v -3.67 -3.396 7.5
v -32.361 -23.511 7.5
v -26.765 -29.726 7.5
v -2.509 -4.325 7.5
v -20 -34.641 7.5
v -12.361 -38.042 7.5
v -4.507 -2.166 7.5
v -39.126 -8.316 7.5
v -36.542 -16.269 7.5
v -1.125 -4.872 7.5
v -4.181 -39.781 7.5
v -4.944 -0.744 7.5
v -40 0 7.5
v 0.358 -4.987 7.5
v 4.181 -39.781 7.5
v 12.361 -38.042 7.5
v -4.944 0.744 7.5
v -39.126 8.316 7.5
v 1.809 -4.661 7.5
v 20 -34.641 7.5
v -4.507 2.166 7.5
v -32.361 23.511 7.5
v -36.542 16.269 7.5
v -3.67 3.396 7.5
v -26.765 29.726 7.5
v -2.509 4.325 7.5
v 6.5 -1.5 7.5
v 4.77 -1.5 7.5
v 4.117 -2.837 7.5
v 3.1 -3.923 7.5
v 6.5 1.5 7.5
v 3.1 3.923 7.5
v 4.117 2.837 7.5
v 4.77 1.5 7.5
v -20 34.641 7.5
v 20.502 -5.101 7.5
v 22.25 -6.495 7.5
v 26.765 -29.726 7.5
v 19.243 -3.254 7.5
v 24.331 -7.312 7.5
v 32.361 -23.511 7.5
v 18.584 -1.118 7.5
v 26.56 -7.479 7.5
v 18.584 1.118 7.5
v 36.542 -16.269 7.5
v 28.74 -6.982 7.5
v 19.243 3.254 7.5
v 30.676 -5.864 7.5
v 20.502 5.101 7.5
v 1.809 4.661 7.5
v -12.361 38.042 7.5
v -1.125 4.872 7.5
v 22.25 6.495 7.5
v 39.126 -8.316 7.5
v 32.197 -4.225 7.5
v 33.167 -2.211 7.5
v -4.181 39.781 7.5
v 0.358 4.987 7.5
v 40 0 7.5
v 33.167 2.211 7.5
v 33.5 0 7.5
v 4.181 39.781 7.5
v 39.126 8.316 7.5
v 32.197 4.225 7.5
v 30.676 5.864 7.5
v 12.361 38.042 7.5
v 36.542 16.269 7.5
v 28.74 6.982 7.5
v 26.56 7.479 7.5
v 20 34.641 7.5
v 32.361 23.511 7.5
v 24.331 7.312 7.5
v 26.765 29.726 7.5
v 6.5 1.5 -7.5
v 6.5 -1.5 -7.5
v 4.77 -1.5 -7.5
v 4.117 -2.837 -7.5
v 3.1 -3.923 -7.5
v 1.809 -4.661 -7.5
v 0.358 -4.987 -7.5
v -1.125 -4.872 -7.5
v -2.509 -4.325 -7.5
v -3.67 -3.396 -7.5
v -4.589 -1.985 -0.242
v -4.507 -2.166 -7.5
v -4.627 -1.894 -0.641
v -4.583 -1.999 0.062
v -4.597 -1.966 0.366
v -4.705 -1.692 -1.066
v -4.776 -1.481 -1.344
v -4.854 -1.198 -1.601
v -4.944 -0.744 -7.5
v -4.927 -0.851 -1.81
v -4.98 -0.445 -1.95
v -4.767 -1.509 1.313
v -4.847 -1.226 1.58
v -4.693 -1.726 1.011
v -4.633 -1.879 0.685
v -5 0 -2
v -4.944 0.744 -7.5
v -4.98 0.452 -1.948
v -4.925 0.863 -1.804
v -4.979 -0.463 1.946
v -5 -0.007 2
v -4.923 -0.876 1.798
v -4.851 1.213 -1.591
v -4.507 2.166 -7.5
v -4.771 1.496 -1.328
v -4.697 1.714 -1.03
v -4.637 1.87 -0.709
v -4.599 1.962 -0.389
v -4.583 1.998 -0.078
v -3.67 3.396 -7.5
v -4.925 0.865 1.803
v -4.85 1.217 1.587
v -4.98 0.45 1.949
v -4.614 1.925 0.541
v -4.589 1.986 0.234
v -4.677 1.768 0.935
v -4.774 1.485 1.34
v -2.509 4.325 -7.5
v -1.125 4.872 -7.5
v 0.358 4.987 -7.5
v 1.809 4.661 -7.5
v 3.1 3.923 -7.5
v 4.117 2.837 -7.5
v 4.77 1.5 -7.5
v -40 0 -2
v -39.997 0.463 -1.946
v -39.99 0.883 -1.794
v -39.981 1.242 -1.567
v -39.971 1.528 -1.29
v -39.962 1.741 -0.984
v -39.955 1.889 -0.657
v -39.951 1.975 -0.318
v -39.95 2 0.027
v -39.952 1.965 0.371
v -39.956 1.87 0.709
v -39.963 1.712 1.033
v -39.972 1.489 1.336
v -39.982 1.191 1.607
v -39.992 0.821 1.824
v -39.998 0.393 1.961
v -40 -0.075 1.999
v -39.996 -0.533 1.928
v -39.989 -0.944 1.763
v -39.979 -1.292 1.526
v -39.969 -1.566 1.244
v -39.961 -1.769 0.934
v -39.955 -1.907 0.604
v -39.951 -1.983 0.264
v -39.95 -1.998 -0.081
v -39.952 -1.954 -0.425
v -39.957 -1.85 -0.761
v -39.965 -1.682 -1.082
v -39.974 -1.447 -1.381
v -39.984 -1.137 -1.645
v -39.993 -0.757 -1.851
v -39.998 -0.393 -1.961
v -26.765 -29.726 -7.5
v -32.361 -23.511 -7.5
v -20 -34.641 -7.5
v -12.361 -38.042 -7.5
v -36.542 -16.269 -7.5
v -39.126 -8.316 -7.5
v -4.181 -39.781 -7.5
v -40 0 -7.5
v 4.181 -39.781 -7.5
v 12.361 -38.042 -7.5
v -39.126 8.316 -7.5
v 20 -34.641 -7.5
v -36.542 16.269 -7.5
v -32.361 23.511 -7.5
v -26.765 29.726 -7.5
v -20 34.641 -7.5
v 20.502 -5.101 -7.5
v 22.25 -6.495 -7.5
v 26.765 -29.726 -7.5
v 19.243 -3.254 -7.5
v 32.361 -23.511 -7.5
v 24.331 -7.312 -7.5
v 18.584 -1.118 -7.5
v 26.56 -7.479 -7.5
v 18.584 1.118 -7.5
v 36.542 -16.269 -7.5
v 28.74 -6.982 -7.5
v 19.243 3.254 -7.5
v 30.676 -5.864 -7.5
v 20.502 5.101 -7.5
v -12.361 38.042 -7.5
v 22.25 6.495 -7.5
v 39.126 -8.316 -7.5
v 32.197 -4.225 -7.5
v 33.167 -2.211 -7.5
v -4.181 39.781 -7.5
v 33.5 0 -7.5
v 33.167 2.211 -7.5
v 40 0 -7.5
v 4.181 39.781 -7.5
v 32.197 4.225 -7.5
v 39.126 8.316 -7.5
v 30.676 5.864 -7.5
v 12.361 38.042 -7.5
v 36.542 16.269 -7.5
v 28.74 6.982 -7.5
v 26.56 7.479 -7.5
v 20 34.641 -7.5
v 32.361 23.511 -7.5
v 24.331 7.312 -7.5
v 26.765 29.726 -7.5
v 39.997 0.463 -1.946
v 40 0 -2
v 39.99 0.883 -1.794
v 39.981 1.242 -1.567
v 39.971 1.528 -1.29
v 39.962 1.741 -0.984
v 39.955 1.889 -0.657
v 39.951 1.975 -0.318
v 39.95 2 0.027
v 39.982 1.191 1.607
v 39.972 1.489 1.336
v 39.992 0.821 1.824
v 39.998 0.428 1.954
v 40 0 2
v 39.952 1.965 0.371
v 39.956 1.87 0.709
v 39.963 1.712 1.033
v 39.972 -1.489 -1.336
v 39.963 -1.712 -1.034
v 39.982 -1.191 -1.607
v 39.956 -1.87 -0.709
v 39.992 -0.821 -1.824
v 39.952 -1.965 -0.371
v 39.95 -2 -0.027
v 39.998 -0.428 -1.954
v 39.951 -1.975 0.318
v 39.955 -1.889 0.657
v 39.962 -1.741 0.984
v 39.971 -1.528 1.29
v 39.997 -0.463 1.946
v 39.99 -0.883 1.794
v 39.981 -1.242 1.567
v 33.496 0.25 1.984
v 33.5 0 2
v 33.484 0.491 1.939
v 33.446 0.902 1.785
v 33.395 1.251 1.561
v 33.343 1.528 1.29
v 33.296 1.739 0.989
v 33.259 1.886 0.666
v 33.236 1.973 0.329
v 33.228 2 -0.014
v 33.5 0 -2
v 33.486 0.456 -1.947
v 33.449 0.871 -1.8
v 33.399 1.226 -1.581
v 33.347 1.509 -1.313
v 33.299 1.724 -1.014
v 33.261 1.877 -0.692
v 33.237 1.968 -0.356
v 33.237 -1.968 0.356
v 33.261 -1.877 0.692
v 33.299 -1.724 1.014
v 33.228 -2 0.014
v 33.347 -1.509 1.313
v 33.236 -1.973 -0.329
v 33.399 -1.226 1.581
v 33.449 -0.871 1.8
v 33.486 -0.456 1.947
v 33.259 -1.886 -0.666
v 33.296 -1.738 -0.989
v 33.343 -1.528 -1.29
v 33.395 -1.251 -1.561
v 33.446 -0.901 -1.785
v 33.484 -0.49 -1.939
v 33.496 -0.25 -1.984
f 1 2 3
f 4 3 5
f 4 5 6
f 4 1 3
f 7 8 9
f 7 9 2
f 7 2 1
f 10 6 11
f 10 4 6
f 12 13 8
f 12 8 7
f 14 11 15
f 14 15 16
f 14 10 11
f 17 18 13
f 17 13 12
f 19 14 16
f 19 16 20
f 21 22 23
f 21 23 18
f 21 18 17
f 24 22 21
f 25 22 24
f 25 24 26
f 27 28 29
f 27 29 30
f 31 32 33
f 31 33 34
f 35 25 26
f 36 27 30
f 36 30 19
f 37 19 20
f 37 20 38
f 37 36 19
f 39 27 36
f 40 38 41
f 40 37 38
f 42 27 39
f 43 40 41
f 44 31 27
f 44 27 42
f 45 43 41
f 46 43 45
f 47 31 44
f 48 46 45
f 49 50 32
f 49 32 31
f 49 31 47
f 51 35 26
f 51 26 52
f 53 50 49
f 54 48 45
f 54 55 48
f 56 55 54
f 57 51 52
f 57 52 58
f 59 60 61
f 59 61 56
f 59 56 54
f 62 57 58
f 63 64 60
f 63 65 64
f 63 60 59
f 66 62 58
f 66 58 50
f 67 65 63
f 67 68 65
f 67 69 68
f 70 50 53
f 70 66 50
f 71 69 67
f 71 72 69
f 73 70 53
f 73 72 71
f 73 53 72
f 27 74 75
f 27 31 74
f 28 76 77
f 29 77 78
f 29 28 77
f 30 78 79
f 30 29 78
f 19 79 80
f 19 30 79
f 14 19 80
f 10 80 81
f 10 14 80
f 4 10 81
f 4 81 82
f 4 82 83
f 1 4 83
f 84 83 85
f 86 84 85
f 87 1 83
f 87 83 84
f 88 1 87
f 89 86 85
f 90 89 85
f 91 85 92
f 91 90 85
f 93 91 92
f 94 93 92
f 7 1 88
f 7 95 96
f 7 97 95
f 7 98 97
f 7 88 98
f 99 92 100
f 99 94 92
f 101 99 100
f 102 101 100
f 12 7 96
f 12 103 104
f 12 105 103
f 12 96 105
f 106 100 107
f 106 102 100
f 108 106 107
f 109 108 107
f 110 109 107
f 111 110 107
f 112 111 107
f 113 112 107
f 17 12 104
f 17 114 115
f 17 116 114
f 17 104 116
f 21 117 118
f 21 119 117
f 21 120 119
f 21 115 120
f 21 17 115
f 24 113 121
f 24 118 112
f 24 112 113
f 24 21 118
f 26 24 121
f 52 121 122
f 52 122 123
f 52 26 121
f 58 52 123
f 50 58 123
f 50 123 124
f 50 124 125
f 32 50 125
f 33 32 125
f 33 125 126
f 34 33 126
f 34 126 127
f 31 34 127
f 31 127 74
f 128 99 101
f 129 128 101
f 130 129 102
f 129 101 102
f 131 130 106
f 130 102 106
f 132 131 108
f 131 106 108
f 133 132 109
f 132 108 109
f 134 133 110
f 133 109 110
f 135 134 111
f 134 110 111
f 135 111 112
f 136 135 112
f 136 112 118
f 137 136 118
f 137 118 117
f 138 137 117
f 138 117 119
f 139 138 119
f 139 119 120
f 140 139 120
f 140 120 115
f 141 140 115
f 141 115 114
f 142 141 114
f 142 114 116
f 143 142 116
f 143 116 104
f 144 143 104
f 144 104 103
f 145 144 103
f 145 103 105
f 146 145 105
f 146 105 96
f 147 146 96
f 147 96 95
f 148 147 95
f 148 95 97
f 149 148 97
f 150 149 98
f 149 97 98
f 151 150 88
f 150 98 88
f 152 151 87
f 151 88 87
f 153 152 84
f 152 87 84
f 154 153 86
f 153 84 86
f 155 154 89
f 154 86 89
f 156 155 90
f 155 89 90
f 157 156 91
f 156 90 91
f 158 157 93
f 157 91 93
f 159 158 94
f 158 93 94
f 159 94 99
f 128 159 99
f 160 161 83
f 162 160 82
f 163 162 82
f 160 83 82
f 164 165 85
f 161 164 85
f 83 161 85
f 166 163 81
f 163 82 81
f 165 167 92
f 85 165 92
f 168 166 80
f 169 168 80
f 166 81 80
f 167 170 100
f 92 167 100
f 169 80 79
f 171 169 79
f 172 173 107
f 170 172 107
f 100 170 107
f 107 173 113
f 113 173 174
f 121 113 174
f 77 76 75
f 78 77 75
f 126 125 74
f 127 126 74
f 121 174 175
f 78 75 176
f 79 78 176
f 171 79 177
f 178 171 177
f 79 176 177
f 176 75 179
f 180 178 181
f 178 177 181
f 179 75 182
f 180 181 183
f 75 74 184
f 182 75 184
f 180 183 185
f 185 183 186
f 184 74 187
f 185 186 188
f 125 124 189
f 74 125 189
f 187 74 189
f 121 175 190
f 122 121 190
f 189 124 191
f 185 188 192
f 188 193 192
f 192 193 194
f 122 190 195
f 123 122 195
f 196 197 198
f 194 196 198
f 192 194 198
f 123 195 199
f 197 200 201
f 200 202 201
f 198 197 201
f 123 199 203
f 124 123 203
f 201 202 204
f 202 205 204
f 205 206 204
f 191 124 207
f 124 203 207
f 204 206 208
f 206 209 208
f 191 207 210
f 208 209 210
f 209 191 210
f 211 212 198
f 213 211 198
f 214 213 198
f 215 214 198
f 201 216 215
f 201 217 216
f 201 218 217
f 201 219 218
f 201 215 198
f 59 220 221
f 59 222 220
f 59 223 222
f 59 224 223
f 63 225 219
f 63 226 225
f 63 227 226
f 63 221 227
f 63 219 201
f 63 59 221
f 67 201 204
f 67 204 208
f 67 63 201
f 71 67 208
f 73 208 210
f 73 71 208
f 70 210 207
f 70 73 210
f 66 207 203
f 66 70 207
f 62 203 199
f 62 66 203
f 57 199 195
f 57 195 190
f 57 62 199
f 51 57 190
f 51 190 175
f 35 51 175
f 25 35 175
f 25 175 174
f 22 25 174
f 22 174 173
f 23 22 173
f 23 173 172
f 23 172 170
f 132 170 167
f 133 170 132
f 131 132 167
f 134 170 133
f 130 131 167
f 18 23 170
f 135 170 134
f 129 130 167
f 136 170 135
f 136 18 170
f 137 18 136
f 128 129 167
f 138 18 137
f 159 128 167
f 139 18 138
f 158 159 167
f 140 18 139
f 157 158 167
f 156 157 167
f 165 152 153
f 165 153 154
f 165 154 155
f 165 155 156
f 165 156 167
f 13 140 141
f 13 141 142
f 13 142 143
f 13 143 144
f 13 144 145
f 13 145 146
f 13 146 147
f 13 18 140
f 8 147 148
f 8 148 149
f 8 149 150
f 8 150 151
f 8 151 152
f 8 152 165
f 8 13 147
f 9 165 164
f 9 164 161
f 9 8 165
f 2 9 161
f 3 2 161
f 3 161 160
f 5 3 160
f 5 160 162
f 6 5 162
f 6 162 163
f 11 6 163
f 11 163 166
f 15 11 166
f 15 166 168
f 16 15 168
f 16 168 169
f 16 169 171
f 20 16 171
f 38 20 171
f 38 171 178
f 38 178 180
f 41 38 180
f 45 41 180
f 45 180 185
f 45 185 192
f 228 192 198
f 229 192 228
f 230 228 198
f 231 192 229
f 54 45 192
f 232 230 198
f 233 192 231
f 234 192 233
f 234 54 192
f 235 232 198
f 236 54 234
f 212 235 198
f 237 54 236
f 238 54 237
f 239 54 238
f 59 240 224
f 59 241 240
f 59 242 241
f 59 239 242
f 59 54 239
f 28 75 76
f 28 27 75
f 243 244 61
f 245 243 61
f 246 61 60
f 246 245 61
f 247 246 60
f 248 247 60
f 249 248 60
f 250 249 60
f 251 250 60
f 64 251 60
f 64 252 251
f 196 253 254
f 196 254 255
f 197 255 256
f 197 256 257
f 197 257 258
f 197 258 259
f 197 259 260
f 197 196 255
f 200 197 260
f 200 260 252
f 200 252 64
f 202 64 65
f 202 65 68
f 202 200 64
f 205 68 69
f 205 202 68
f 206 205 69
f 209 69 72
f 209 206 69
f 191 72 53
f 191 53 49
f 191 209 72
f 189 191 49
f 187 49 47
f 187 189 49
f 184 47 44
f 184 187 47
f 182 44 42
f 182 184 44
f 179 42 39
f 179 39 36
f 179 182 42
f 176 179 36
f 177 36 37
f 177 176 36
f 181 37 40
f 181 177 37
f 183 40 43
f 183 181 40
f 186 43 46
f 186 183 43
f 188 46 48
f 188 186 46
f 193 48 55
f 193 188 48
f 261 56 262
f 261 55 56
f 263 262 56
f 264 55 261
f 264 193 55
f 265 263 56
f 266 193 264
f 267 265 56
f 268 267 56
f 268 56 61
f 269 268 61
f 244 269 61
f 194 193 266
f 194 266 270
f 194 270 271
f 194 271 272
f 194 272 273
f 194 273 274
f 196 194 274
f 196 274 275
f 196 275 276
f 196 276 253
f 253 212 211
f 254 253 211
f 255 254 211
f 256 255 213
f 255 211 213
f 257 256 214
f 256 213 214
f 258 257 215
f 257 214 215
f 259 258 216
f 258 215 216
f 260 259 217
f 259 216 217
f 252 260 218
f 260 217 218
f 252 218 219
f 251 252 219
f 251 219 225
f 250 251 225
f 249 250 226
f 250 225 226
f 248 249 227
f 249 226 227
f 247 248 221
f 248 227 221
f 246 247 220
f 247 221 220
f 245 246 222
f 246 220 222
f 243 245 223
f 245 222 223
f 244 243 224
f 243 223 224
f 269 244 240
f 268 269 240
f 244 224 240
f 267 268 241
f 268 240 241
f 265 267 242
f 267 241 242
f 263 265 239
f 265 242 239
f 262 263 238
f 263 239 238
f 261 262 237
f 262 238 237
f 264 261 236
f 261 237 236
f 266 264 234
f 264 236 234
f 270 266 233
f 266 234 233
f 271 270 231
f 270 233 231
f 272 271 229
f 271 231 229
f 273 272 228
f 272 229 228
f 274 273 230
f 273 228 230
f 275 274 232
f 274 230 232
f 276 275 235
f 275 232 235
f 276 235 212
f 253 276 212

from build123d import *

# Parameters (mm, degrees)
SKETCH1_R               = 40
SKETCH1_R_2             = 7.5
BOSS_EXTRUDE1_DEPTH     = 7.5
CUT_EXTRUDE1_REACH      = 59.064
CUT_EXTRUDE1_END_RADIUS = 40
SKETCH2_R               = 2
CUT_EXTRUDE2_REACH      = 99.064
CUT_EXTRUDE2_END_RADIUS = 7.5
CUT_EXTRUDE2_START      = 40
SKETCH2_2_R             = 2


with BuildPart() as part:
    # Sketch1 → Boss-Extrude1 (new, symmetric)
    with BuildSketch(Plane.XY):
        Circle(SKETCH1_R)
        with Locations((26, 0)):
            Circle(SKETCH1_R_2, mode=Mode.SUBTRACT)
        with BuildLine():
            Line((4.769696007, 1.5), (6.5, 1.5))
            Line((6.5, 1.5), (6.5, -1.5))
            Line((6.5, -1.5), (4.769696007, -1.5))
            ThreePointArc((4.769696007, -1.5), (-5, 0), (4.769696007, 1.5))
        make_face(mode=Mode.SUBTRACT)
    extrude(amount=BOSS_EXTRUDE1_DEPTH, both=True)

    # Cut-Extrude1: up to this cylinder (the profile starts inside it)
    cut_extrude1_end = Plane(origin=(0, 0, 0), z_dir=(0, 0, -1)) * Cylinder(CUT_EXTRUDE1_END_RADIUS, 199.128, mode=Mode.PRIVATE)
    # Sketch2 → Cut-Extrude1 (cut, up to the surface)
    with BuildSketch(Plane(origin=(0, 0, 0), x_dir=(0, 0, -1), z_dir=(1, 0, 0)), mode=Mode.PRIVATE) as cut_extrude1_sk1:
        Circle(SKETCH2_R)
    cut_extrude1_tool1 = extrude(cut_extrude1_sk1.sketch, amount=-CUT_EXTRUDE1_REACH, mode=Mode.PRIVATE) & cut_extrude1_end
    add(cut_extrude1_tool1.solids().sort_by_distance((0, 0, 0))[0], mode=Mode.SUBTRACT)

    # Cut-Extrude2: up to this cylinder (the profile starts outside it)
    cut_extrude2_end = Plane(origin=(26, 0, 0), z_dir=(0, 0, -1)) * Cylinder(CUT_EXTRUDE2_END_RADIUS, 214.128, mode=Mode.PRIVATE)
    # Sketch2<2> → Cut-Extrude2 (cut, up to the surface)
    with BuildSketch(Plane(origin=(0, 0, 0), x_dir=(0, 0, -1), z_dir=(1, 0, 0)).offset(CUT_EXTRUDE2_START), mode=Mode.PRIVATE) as cut_extrude2_sk1:
        Circle(SKETCH2_2_R)
    cut_extrude2_tool1 = extrude(cut_extrude2_sk1.sketch, amount=-CUT_EXTRUDE2_REACH, mode=Mode.PRIVATE) - cut_extrude2_end
    add(cut_extrude2_tool1.solids().sort_by_distance((40, 0, 0))[0], mode=Mode.SUBTRACT)


solid = part.part
